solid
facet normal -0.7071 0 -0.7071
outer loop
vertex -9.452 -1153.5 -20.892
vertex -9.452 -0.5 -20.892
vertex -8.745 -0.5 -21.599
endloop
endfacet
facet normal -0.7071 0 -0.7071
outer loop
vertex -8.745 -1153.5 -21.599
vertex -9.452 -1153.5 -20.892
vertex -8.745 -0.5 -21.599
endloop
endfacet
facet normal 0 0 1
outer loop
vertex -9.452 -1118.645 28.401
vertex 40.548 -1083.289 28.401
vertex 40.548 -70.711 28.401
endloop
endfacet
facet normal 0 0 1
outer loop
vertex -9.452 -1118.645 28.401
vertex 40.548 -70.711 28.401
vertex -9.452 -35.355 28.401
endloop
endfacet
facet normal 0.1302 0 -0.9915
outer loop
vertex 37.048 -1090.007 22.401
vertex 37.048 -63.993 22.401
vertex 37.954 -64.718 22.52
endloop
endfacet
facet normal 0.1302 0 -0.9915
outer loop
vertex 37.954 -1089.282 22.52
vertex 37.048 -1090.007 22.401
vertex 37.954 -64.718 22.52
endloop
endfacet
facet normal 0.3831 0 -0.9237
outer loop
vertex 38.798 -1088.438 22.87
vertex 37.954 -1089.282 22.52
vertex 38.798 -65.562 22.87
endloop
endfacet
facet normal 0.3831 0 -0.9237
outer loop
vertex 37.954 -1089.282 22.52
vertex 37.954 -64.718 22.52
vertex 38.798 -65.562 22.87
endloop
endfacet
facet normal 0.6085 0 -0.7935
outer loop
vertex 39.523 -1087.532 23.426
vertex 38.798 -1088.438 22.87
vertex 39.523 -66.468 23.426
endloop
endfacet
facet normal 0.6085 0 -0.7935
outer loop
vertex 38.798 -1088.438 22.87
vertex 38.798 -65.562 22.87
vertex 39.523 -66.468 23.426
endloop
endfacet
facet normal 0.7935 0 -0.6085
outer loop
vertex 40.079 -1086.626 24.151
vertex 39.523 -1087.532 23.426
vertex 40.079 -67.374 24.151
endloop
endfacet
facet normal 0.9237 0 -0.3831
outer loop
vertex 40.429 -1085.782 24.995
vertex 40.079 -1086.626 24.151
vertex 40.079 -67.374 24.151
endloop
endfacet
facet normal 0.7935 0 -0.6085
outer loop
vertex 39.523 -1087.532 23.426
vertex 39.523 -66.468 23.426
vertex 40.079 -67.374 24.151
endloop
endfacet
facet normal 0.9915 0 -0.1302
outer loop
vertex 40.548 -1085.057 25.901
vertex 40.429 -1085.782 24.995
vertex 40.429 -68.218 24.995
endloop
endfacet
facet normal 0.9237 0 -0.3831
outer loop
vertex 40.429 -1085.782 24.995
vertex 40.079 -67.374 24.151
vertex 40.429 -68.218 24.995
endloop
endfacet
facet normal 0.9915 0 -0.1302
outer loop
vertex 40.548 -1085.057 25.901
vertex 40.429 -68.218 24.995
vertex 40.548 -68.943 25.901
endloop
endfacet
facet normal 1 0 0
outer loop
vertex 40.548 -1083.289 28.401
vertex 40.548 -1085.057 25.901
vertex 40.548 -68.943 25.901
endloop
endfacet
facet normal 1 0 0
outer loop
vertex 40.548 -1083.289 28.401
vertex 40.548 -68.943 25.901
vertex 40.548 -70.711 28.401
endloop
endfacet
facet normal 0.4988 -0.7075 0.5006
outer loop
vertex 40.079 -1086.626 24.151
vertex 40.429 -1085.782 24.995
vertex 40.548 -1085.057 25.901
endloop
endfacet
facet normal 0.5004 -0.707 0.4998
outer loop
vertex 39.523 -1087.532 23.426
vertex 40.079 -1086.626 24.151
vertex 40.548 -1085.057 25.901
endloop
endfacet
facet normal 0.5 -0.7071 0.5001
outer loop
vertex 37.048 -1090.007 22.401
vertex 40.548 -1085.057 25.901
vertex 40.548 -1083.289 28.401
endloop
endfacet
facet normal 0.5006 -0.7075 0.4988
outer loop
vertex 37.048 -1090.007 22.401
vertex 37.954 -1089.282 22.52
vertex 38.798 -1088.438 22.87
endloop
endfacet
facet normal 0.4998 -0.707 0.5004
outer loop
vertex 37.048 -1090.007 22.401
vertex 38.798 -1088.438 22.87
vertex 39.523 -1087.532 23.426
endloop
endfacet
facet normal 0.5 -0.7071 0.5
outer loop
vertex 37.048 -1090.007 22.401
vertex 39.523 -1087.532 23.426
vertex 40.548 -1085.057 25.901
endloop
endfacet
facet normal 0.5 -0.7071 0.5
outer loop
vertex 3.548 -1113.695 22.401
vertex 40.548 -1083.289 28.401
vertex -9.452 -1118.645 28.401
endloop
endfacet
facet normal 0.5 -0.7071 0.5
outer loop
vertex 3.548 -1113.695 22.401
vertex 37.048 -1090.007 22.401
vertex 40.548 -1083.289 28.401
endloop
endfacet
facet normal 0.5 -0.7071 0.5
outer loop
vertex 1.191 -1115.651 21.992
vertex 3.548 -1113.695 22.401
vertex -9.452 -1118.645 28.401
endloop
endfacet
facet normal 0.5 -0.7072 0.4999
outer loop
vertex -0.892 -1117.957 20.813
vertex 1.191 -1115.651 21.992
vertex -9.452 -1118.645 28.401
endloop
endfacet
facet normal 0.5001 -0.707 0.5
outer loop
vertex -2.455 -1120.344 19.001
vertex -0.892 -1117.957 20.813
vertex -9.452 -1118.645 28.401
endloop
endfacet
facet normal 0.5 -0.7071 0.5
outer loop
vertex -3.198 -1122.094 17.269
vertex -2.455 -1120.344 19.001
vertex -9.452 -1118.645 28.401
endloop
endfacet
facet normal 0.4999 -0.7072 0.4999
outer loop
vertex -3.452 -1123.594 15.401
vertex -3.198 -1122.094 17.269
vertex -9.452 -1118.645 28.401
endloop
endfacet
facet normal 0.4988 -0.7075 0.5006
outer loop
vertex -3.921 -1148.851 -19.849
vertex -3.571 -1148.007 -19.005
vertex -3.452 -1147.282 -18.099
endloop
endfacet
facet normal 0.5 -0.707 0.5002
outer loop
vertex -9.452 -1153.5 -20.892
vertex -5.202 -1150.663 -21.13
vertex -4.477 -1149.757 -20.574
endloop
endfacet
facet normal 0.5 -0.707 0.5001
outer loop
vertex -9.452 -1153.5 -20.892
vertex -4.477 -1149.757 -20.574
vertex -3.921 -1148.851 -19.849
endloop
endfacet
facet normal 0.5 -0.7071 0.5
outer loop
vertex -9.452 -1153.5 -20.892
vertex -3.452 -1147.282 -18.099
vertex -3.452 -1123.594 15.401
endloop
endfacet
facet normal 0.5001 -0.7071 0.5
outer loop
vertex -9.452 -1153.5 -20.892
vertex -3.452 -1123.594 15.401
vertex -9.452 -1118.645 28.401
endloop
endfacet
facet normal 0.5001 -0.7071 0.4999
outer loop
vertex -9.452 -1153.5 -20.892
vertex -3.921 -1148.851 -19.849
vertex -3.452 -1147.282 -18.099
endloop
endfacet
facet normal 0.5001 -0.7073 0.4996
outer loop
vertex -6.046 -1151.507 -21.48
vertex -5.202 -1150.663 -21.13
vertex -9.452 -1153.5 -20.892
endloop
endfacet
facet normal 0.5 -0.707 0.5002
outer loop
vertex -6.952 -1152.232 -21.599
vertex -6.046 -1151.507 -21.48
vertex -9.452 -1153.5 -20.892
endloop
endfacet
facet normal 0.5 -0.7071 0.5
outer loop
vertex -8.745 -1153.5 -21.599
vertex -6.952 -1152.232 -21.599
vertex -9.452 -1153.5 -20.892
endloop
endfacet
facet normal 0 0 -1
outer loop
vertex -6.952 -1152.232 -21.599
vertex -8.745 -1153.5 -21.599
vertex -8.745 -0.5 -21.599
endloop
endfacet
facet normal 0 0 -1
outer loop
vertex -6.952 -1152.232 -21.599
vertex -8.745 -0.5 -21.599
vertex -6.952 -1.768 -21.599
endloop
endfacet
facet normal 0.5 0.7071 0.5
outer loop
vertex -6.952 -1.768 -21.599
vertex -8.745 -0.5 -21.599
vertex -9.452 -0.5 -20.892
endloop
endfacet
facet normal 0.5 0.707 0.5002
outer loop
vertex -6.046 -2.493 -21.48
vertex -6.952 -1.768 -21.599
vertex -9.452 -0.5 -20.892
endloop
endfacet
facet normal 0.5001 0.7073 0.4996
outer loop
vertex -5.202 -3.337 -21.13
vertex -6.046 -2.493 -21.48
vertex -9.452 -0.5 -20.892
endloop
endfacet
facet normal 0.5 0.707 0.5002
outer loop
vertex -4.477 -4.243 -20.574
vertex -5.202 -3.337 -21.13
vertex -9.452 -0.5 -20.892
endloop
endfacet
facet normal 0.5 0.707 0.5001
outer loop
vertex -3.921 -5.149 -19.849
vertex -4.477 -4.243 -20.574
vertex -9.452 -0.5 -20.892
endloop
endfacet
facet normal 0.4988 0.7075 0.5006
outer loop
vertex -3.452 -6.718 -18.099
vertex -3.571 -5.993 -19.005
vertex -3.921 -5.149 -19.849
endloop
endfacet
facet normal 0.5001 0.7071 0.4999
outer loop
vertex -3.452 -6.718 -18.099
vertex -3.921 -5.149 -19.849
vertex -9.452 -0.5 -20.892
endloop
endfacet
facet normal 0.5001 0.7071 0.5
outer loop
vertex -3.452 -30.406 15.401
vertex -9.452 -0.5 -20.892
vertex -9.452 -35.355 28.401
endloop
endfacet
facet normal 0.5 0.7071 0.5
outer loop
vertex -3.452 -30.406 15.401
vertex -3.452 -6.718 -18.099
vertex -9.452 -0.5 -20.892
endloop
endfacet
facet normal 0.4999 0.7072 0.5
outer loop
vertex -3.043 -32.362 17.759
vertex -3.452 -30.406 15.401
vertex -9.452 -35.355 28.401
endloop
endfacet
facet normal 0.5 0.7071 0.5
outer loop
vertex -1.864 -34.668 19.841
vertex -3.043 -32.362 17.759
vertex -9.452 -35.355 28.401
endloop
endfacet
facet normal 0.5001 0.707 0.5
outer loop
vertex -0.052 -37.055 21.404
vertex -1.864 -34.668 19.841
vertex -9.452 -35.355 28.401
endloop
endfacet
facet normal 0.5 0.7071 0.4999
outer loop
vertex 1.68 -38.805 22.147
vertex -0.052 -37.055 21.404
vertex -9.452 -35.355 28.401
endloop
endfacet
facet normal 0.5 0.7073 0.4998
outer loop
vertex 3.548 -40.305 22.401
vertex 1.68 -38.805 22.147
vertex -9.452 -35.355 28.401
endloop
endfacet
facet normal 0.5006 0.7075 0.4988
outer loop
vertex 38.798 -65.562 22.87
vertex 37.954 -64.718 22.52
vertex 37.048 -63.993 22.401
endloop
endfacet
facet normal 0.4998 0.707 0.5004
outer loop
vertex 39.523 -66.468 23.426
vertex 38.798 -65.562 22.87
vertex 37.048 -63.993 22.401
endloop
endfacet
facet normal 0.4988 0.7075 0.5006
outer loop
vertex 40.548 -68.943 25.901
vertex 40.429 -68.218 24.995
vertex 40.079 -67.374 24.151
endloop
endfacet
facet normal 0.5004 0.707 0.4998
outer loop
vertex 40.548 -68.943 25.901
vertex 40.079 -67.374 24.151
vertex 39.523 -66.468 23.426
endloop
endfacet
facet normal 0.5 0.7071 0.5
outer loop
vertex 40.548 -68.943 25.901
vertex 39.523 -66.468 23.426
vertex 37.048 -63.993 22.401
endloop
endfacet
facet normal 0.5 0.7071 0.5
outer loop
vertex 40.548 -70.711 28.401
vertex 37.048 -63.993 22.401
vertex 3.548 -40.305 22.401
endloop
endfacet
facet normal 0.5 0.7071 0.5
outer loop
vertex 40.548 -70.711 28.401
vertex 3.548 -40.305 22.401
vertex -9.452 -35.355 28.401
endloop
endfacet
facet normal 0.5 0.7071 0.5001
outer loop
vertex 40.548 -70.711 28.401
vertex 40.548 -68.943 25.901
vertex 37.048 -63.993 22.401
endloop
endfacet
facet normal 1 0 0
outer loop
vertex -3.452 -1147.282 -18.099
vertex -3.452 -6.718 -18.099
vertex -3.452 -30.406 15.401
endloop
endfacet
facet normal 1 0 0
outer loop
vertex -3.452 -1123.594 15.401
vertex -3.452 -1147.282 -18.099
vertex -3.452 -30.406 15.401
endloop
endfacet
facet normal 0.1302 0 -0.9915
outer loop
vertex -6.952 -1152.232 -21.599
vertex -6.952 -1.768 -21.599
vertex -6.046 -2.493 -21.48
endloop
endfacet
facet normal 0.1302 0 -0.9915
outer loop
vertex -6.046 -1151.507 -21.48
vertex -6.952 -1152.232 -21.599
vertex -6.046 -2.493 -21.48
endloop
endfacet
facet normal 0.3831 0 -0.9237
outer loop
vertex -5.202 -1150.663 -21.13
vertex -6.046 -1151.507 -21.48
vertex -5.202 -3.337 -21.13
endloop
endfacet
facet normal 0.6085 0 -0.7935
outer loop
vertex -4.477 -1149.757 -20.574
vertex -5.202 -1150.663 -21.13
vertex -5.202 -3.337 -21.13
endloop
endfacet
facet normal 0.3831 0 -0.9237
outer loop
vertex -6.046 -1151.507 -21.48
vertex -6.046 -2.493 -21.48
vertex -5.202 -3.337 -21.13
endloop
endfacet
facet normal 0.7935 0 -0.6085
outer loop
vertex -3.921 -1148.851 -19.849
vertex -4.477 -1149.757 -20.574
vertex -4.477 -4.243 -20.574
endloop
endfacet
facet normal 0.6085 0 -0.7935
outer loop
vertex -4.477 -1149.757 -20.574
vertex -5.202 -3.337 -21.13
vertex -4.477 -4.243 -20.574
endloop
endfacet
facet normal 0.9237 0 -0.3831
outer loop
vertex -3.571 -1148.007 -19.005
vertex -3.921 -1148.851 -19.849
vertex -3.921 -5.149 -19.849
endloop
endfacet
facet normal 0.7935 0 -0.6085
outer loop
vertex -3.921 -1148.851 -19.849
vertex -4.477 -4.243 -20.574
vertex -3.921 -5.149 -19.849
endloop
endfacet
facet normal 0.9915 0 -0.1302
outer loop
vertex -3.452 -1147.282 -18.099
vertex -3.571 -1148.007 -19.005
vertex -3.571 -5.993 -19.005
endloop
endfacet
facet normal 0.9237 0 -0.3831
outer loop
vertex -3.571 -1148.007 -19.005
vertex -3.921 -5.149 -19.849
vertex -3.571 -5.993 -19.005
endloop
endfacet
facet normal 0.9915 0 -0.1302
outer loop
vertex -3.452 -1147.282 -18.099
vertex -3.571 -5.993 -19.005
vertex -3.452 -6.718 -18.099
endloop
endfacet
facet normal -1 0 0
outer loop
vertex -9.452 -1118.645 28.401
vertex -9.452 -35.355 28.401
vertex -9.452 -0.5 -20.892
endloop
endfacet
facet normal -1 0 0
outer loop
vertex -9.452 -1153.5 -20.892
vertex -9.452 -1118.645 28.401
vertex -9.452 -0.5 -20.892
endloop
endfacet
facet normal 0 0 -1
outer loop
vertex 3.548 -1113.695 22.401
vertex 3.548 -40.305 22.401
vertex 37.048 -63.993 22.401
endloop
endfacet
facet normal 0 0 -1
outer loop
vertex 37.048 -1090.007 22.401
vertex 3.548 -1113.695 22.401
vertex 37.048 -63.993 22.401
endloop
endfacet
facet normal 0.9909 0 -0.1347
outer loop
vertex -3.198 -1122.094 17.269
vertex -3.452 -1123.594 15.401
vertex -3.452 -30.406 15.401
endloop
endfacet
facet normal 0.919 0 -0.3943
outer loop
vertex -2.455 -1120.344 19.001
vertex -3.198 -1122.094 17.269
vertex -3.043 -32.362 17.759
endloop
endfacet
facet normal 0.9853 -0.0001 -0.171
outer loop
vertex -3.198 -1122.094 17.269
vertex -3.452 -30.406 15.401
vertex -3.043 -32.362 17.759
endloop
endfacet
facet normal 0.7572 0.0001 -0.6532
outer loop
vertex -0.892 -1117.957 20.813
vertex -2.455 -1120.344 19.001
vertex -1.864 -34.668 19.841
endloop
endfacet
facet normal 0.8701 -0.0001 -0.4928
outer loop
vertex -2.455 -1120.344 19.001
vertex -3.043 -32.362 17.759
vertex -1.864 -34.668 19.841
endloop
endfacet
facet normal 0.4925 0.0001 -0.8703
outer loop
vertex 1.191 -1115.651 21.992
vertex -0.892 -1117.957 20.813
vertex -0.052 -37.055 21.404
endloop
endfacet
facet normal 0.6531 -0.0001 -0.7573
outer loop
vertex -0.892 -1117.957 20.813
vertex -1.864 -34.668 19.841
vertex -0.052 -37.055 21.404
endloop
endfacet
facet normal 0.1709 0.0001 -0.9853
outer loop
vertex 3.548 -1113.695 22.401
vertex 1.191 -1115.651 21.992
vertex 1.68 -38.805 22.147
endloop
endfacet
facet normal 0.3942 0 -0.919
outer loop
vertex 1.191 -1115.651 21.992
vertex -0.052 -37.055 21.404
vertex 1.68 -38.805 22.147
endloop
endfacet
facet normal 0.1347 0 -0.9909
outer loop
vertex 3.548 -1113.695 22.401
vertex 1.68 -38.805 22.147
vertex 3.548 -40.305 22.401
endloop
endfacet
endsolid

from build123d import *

# Parameters (mm, degrees)
F1_DEPTH  = 1154
F7_DEPTH  = 45
F9_DEPTH  = 45
F11_W     = 4.8190290108
F11_H     = 1158.3167838398
F12_DEPTH = 0.5


with BuildPart() as f1:
    # F0 (on Front) → F1 (new body)
    with BuildSketch(Plane.XZ):
        with BuildLine():
            Line((-9.4517558242, 28.4011573891), (-9.4517558242, -21.5988426109))
            Line((-9.4517558242, -21.5988426109), (-6.9517558242, -21.5988426109))
            ThreePointArc((-6.9517558242, -21.5988426109), (-4.47688209, -20.5737163451), (-3.4517558242, -18.0988426109))
            Line((-3.4517558242, -18.0988426109), (-3.4517558242, 15.4011573891))
            ThreePointArc((-3.4517558242, 15.4011573891), (-1.4015032925, 20.3509048574), (3.5482441758, 22.4011573891))
            Line((3.5482441758, 22.4011573891), (37.0482441758, 22.4011573891))
            ThreePointArc((37.0482441758, 22.4011573891), (39.52311791, 23.4262836549), (40.5482441758, 25.9011573891))
            Line((40.5482441758, 25.9011573891), (40.5482441758, 28.4011573891))
            Line((40.5482441758, 28.4011573891), (-9.4517558242, 28.4011573891))
        make_face()
    extrude(amount=F1_DEPTH)

    # F6 (on 3pt) → F7 (cut)
    with BuildSketch(Plane(origin=(8.0484171275, 0, -8.0484171275), x_dir=(0, -1, 0), z_dir=(-0.7071067812, 0, 0.7071067812))):
        Polygon((0, 48.7545894053), (0, -21.9560887134), (70.7106781187, 48.7545894053), align=None)
    extrude(amount=F7_DEPTH, mode=Mode.SUBTRACT)

    # F8 (on 3pt) → F9 (cut)
    with BuildSketch(Plane(origin=(8.0484171275, 0, -8.0484171275), x_dir=(0, -1, 0), z_dir=(-0.7071067812, 0, 0.7071067812))):
        Polygon((1083.2893218813, 48.7545894053), (1154, -21.9560887134), (1154, 48.7545894053), align=None)
    extrude(amount=F9_DEPTH, mode=Mode.SUBTRACT)

    # F11 (on face) → F12 (cut)
    with BuildSketch(Plane(origin=(-15.5252992176, 0, -15.5252992176), x_dir=(0.7071067812, 0, -0.7071067812), z_dir=(-0.7071067812, 0, -0.7071067812))):
        with Locations((8.6135719903, 577.1591997473)):
            Rectangle(F11_W, F11_H)
    extrude(amount=-F12_DEPTH, mode=Mode.SUBTRACT)


solid = f1.part
